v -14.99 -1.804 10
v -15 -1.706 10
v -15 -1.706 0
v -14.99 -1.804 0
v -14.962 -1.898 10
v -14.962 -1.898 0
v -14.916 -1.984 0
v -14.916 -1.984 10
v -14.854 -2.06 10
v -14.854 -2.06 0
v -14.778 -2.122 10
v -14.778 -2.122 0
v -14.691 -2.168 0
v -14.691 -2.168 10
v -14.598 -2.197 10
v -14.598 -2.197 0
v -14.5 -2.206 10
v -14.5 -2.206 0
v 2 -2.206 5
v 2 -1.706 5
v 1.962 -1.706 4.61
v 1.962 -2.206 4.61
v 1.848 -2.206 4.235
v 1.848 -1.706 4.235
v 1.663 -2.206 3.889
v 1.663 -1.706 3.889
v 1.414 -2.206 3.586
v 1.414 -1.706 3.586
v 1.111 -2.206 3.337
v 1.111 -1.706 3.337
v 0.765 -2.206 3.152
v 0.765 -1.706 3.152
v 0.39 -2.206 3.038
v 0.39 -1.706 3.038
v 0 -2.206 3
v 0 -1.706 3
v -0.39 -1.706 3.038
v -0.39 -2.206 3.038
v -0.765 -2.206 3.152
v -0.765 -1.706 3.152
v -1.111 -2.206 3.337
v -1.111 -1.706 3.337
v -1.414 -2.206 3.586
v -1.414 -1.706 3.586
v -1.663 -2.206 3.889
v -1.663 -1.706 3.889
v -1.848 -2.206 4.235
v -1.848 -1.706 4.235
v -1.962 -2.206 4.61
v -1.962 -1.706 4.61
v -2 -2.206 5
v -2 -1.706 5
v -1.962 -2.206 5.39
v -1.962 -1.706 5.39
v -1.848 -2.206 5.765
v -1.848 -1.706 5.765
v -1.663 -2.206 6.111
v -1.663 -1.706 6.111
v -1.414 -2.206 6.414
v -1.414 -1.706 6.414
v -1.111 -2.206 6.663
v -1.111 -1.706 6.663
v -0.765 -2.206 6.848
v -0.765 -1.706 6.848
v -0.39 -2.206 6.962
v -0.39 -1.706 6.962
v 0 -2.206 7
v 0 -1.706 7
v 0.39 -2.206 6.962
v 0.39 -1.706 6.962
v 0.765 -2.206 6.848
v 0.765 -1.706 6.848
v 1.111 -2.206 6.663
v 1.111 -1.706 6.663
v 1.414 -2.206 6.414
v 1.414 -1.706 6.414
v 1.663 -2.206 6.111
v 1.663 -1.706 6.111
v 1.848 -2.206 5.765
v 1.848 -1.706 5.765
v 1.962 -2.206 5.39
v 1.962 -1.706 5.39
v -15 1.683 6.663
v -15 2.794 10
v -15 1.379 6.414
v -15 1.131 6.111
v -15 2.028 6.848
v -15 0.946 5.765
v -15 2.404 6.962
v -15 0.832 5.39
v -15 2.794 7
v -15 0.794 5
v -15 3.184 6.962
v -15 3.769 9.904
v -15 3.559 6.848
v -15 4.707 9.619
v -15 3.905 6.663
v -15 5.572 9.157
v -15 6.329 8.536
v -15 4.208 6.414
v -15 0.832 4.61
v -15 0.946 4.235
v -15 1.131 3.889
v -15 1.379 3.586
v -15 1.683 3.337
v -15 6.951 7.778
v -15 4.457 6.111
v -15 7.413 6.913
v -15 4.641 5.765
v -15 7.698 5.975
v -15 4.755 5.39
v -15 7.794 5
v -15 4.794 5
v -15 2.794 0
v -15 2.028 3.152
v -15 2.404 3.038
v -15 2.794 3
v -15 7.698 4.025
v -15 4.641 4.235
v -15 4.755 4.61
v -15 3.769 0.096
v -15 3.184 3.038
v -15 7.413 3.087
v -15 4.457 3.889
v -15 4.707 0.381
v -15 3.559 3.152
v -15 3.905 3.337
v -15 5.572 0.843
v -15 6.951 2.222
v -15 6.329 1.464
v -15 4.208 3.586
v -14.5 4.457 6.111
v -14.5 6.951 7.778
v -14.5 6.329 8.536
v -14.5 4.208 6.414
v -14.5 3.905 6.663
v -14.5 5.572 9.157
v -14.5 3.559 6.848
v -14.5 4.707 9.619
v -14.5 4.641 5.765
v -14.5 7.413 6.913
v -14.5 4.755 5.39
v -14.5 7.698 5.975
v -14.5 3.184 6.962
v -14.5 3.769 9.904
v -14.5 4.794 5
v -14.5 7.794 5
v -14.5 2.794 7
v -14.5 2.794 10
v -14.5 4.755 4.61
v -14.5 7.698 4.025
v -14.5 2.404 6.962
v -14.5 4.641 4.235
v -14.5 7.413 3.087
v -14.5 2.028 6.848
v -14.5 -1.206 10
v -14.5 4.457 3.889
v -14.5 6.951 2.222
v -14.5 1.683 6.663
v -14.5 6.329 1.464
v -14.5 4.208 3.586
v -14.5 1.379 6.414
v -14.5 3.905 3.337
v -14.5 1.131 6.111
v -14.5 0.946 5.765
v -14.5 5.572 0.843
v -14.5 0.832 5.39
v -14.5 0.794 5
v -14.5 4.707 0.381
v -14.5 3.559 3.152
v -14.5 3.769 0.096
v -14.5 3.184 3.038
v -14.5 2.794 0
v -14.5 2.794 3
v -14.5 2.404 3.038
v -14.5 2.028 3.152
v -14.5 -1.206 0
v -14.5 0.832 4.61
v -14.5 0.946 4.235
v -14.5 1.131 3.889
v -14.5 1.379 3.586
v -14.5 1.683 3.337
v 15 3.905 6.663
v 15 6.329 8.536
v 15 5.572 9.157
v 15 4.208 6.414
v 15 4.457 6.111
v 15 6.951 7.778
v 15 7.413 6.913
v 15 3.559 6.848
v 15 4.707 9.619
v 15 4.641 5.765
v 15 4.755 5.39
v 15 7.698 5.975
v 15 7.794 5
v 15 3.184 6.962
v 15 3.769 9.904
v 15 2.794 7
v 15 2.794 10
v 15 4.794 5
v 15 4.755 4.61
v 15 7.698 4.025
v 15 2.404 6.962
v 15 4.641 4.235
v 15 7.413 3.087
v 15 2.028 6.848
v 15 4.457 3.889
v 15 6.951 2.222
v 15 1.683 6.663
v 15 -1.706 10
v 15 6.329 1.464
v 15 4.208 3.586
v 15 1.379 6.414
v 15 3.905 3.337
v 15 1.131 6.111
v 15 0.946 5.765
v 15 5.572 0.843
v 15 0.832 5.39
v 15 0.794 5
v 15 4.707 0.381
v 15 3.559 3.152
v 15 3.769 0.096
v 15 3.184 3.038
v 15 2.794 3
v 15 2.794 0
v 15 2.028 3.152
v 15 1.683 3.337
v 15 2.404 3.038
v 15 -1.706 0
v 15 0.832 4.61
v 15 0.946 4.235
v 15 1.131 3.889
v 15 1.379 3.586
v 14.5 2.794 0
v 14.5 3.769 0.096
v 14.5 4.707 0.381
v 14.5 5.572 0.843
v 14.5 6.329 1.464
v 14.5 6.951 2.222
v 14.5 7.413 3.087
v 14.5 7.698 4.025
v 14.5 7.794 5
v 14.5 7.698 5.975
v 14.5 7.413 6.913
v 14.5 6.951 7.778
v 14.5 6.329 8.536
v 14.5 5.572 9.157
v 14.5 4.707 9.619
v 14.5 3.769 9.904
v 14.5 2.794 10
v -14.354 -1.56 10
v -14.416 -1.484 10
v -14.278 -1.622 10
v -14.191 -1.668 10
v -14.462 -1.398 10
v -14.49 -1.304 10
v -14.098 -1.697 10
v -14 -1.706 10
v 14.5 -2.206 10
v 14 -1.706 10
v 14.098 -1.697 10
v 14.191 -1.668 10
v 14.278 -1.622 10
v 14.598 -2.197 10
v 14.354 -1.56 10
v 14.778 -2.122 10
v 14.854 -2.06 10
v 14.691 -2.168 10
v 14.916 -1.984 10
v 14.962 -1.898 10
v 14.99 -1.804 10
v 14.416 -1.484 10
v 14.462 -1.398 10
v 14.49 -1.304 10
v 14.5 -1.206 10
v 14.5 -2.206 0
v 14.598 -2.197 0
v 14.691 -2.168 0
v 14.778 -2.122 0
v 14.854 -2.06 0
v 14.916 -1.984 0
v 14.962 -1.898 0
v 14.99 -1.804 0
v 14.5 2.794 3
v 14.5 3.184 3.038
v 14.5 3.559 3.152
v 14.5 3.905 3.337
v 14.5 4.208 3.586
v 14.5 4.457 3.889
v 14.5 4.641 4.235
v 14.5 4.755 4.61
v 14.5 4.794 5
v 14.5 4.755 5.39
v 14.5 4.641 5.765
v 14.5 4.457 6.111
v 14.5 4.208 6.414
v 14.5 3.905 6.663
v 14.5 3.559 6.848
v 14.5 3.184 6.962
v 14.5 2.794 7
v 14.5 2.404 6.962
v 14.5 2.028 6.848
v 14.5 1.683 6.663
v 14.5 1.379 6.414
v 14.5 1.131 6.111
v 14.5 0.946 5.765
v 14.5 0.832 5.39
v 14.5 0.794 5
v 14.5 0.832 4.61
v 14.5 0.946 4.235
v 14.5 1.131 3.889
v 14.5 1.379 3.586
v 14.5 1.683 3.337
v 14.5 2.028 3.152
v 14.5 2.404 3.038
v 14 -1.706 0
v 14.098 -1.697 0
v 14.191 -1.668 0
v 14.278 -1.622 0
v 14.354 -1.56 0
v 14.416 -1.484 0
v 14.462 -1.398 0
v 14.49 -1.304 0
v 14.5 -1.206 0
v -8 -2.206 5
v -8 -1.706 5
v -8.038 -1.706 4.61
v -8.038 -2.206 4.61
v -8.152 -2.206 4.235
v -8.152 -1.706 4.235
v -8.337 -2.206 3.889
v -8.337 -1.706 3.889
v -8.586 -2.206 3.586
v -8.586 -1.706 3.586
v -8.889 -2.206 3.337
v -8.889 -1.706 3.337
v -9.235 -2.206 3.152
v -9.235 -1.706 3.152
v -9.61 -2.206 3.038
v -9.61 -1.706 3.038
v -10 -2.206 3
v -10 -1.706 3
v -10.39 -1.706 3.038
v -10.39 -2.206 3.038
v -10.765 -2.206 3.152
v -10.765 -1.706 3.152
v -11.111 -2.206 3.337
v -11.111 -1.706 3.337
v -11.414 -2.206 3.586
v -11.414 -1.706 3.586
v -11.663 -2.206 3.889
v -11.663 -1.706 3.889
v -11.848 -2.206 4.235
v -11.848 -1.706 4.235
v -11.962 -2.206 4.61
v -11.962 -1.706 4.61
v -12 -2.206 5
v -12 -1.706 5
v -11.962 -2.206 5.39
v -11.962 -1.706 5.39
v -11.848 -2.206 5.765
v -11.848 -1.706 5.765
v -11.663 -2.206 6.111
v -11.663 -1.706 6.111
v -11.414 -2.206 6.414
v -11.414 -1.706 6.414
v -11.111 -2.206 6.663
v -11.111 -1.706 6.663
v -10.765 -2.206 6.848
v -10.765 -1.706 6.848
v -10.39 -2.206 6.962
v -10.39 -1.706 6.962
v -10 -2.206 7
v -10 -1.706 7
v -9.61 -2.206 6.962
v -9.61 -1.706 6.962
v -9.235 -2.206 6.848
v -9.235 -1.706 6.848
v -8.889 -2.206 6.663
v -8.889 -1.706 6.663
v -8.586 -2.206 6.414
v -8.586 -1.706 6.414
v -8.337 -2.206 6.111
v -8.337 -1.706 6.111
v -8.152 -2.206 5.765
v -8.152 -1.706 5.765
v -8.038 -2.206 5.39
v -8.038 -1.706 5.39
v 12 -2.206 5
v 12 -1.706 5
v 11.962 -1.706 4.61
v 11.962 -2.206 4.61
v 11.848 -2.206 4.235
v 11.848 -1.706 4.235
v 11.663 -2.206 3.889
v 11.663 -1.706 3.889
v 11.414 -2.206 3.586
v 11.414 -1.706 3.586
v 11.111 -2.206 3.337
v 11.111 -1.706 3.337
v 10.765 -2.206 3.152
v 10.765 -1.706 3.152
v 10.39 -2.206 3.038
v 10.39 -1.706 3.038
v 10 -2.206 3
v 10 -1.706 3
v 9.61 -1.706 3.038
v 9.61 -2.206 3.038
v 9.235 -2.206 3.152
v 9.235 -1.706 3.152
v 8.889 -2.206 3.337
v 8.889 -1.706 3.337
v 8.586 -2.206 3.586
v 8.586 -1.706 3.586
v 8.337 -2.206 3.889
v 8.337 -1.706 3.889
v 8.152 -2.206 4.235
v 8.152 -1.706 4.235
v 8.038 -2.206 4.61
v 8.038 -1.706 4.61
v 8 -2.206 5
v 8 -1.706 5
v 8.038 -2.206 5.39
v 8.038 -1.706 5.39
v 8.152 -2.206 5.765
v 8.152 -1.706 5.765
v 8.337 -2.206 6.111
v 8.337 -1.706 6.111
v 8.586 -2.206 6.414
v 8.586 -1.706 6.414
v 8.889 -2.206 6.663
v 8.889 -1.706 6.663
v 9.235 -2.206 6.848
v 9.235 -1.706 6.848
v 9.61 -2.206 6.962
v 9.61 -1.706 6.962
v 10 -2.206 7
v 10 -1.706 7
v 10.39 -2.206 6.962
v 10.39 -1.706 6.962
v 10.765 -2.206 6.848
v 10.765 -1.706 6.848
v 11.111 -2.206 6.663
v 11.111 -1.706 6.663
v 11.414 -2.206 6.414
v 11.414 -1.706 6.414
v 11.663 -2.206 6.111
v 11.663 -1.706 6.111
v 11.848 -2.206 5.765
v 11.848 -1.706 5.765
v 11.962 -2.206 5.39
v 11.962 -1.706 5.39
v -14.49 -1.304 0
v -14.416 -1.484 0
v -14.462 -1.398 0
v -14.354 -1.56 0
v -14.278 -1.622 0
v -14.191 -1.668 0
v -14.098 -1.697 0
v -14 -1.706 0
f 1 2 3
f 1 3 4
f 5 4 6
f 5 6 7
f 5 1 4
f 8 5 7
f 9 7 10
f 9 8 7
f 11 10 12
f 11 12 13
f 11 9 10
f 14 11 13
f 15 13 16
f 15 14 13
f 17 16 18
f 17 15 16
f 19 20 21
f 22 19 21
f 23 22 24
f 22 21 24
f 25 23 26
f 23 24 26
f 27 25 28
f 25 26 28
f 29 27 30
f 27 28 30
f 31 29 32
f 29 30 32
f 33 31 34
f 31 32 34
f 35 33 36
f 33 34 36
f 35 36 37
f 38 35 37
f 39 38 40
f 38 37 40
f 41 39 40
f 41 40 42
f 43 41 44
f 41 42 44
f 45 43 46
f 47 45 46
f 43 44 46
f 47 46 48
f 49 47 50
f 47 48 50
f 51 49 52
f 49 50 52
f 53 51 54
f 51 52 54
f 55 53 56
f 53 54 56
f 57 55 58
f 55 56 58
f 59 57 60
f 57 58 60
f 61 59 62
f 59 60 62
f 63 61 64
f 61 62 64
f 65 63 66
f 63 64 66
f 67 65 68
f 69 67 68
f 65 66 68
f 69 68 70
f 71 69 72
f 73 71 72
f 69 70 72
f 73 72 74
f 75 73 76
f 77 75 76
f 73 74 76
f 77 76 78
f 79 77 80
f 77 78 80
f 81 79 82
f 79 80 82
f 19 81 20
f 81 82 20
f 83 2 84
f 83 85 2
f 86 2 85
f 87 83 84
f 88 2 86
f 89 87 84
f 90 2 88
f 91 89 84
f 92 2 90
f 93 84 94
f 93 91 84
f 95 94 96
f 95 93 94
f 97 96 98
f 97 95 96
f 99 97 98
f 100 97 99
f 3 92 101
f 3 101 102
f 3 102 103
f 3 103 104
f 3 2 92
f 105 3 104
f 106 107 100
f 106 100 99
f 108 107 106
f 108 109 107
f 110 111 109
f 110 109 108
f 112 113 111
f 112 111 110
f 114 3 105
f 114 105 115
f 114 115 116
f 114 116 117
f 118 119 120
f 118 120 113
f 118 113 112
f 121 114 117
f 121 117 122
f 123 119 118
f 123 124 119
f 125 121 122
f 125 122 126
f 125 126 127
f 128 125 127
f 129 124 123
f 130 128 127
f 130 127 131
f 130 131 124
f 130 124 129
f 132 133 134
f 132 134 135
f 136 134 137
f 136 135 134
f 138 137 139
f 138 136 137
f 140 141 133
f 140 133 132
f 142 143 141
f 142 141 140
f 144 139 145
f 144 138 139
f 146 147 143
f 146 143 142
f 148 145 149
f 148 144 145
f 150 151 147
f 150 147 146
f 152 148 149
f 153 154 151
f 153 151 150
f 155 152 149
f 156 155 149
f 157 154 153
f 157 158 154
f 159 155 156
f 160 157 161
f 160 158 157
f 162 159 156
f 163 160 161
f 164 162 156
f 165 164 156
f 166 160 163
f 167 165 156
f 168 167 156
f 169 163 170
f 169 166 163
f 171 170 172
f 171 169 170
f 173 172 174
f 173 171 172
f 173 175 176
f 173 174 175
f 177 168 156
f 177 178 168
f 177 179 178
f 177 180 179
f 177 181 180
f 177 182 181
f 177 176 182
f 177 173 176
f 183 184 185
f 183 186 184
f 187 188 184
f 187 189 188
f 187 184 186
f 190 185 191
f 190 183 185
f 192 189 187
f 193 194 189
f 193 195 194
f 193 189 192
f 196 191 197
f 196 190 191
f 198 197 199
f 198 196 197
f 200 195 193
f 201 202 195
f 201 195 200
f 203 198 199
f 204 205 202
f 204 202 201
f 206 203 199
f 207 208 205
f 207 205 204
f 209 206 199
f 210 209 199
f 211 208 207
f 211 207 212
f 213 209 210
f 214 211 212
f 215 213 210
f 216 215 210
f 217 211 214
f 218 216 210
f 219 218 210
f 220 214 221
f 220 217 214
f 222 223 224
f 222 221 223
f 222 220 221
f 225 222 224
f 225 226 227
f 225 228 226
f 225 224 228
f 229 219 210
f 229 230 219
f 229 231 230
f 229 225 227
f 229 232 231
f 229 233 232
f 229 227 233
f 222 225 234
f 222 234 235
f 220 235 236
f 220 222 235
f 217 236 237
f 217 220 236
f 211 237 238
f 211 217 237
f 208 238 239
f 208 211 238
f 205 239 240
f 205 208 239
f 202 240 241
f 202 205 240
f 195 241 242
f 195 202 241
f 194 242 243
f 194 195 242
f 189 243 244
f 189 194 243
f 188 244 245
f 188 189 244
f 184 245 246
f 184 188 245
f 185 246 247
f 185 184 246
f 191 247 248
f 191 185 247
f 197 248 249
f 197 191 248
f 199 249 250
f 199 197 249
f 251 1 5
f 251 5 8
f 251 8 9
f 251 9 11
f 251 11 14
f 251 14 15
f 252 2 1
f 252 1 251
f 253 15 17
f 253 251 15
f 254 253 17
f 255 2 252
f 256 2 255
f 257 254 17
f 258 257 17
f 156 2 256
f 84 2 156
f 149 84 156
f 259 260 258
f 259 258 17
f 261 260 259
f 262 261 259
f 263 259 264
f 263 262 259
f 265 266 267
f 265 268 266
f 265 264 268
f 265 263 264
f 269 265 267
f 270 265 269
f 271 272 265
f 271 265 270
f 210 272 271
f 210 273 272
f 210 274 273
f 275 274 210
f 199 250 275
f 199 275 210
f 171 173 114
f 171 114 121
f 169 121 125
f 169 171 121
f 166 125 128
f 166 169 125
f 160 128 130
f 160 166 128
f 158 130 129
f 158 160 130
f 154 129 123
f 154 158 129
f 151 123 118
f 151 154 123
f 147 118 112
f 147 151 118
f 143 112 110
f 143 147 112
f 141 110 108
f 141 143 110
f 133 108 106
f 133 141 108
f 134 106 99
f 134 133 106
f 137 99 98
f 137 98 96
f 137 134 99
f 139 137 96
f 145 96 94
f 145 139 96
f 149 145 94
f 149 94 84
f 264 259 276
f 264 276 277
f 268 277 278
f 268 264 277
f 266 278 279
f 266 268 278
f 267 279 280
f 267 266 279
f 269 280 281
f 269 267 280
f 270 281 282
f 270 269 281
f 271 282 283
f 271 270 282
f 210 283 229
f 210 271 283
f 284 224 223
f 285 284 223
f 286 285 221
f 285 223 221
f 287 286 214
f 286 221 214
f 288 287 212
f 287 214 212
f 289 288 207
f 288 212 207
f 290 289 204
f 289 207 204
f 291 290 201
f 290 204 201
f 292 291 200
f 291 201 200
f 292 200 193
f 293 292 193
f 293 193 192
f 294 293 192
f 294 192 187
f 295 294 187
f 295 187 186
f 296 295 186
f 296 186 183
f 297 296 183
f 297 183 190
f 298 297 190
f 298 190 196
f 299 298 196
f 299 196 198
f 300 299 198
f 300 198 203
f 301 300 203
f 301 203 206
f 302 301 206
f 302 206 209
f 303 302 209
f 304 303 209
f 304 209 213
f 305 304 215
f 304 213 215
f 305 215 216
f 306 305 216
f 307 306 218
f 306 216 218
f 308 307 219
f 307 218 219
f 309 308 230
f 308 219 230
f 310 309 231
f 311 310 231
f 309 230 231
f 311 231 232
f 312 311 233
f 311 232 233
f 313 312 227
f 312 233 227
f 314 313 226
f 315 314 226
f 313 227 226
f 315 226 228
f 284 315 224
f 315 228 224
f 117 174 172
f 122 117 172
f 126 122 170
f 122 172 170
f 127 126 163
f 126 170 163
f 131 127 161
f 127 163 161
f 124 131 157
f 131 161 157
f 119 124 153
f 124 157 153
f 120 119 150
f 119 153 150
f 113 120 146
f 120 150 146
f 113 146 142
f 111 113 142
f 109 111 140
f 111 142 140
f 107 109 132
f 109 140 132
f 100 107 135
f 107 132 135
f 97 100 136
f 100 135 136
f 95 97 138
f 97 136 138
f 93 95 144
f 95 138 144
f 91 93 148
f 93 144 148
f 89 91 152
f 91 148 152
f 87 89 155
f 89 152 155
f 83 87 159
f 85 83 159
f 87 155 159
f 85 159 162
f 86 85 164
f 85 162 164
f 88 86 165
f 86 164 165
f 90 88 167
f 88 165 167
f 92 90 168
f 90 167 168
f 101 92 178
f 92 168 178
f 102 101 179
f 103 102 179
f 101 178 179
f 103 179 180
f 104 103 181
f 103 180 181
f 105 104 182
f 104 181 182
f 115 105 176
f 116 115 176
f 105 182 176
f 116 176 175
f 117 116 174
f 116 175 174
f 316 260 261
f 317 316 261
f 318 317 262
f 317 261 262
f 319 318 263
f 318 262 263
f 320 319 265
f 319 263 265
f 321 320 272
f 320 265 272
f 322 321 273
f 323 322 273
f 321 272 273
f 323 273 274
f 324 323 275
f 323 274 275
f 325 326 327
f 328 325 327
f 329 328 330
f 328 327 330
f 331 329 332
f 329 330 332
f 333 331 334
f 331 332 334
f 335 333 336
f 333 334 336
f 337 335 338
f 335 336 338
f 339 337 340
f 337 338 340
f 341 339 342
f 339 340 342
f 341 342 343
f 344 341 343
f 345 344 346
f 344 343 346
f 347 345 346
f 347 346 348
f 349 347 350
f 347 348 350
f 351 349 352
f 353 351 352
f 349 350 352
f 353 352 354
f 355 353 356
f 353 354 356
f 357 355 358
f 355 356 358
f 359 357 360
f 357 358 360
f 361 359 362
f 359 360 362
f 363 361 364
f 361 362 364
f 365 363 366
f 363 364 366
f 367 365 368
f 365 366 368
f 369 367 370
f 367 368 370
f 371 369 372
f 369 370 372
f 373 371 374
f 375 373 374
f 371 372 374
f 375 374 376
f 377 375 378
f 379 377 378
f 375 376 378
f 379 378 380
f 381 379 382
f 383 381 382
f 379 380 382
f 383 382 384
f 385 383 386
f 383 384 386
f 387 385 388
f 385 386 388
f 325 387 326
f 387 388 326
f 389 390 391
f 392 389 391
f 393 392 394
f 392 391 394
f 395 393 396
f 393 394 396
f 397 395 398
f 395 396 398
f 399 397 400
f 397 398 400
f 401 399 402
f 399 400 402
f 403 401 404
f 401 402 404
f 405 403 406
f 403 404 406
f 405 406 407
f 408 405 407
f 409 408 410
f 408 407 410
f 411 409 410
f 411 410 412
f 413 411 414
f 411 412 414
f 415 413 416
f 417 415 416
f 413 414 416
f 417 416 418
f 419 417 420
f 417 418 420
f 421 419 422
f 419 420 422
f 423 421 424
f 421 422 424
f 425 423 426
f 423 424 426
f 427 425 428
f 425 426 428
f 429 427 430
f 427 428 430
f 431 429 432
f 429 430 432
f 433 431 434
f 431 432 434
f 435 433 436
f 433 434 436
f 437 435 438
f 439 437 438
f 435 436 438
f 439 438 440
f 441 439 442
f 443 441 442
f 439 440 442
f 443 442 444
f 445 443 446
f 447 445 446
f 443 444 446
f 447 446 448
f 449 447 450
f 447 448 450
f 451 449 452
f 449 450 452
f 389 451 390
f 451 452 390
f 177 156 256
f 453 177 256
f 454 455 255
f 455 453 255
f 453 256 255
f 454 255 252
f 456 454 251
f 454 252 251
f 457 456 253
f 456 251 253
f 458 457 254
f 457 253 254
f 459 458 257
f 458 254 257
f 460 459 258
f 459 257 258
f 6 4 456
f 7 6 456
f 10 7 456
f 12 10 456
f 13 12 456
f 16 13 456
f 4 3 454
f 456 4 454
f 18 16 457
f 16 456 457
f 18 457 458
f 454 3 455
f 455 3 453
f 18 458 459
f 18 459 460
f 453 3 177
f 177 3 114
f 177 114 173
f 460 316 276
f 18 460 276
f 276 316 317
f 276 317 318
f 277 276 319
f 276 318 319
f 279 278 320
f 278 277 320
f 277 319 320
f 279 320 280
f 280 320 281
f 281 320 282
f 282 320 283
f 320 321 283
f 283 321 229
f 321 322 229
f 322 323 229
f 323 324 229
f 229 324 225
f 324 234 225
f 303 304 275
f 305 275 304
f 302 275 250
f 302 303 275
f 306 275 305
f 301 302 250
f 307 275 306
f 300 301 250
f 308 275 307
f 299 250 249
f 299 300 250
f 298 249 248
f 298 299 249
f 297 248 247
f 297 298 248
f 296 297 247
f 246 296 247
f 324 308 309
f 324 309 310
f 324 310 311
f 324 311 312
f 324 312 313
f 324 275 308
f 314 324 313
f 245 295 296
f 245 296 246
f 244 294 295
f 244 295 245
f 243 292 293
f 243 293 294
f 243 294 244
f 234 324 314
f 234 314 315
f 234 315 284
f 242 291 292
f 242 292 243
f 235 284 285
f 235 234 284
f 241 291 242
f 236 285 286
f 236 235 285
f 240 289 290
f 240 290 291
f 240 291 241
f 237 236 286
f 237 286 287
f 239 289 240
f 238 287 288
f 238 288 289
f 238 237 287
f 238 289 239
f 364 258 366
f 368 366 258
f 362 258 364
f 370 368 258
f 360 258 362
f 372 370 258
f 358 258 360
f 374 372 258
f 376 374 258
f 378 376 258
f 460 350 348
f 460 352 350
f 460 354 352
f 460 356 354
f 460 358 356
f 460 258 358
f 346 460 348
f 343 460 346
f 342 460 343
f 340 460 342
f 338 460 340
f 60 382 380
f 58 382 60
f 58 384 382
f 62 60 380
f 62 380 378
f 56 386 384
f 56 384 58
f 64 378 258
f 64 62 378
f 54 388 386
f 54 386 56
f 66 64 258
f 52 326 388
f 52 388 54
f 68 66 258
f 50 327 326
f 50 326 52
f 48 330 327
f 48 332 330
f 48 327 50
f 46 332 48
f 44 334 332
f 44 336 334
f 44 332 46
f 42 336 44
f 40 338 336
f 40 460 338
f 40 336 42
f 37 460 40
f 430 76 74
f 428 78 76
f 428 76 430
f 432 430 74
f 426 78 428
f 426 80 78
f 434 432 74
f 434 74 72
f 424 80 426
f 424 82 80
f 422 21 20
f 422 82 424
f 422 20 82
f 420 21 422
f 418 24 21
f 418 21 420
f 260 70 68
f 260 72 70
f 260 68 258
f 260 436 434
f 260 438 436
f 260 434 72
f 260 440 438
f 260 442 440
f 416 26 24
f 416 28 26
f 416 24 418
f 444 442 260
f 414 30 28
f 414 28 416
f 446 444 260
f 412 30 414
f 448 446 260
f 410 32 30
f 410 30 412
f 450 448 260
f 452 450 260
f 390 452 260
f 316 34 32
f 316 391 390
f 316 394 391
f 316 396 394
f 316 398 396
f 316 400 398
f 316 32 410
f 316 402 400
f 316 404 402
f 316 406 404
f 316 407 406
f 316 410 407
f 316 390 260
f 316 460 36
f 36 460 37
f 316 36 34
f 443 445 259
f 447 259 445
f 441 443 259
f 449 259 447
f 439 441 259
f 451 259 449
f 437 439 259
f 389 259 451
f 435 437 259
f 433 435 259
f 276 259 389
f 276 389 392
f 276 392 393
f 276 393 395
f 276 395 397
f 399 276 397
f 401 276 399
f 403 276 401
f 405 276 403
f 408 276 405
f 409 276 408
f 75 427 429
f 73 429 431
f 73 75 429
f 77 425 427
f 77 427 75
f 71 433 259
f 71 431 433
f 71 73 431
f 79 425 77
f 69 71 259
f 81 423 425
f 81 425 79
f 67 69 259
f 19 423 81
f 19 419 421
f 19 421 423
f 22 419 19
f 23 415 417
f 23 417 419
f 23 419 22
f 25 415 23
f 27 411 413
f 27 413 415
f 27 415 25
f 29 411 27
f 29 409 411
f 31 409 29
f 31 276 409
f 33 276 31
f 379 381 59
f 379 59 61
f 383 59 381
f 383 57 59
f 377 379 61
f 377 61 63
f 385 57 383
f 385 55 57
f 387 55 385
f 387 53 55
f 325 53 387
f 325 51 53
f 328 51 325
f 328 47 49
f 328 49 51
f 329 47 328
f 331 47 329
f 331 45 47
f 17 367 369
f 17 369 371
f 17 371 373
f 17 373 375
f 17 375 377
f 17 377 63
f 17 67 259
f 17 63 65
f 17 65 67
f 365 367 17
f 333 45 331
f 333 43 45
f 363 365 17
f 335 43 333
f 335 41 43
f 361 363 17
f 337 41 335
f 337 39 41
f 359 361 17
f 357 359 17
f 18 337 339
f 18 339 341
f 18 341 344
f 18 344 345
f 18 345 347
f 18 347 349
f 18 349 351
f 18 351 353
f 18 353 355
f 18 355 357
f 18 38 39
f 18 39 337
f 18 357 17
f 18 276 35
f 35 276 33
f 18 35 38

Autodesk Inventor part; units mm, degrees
ref_plane "YZ Plane" through (0, 0, 0) normal (1, 0, 0) x (0, 1, 0)
ref_plane "XZ Plane" through (0, 0, 0) normal (0, 1, 0) x (-1, 0, 0)
ref_plane "XY Plane" through (0, 0, 0) normal (0, 0, 1) x (1, 0, 0)
sketch "Náčrt1" plane through (0, 0, 0) normal (0, 0, 1) x (1, 0, 0)
  line L0 (-14.5, 7.7937) -> (-14.5, -1.7063)
  line L1 (-14.5, -1.7063) -> (14.5, -1.7063)
  line L2 (14.5, -1.7063) -> (14.5, 7.7937)
  line L3 (14.5, 7.7937) -> (15, 7.7937)
  line L4 (15, 7.7937) -> (15, -2.2063)
  line L5 (15, -2.2063) -> (-15, -2.2063)
  line L6 (-15, -2.2063) -> (-15, 7.7937)
  line L7 (-15, 7.7937) -> (-14.5, 7.7937)
  point P0 (0, 0)
  point P1 (14.5, 3.0437)
  point P2 (-14.75, 7.7937)
  point P3 (14.75, 7.7937)
  dimension "d0" = 15
  dimension "d1" = 15
  dimension "d2" = 0.5
  dimension "d3" = 0.5
  dimension "d4" = 0.5
  dimension "d5" = 10
  dimension "d6" = 10
extrude "Vysunutí1" add sketch "Náčrt1" along normal blind 10
sketch "Náčrt2" plane through (15, -2.2063, 0) normal (1, 0, 0) x (0, 0, -1)
  circle A0 centre (-5, 5) radius 2
  line L0 (0, 0) -> (0, 10) projected
  point P0 (0, 2.2063)
  point P1 (0, 5)
  dimension "d9" = 4
  dimension "d10" = 5
extrude "Vysunutí2" cut sketch "Náčrt2" against normal through all
pattern_linear "Obdélníkové pole1" count 10 spacing 10 along (0, 0, 1) of "Vysunutí2"
sketch "Náčrt3" plane through (-14.5, -1.7063, 0) normal (0, 1, 0) x (1, 0, 0)
  circle A0 centre (4.5, -5) radius 2
  line L0 (29, -10) -> (0, -10) projected
  line L1 (-0.5, 0) -> (-0.5, -10) projected
  point P0 (14.5, 0)
  dimension "d16" = 4
  dimension "d17" = 5
  dimension "d18" = 5
extrude "Vysunutí3" cut sketch "Náčrt3" against normal through all
pattern_linear "Obdélníkové pole2" count 10 spacing 10 along (0, 0, -1) count 5 spacing 10 along (1, 0, 0) of "Vysunutí3"
sketch "Náčrt4" plane through (15, -2.2063, 0) normal (1, 0, 0) x (0, 0, -1)
  arc A0 (0, 5) -> (-10, 5) centre (-5, 5) ccw
  line L0 (0, 0) -> (0, 10) projected
  line L1 (0, 0) -> (-10, 0) projected
  line L2 (0, 10) -> (-10, 10) projected
  line L3 (-10, 10) -> (0, 10)
  line L4 (0, 10) -> (0, 5)
  line L5 (0, 10) -> (0, 0.5) projected
  line L6 (-10, 10) -> (-10, 0.5) projected
  line L7 (-10, 5) -> (-10, 10)
  point P0 (0, 2.2063)
  point P1 (-5, 10)
  dimension "d27" = 10
  dimension "d28" = 5
  dimension "d29" = 5
extrude "Vysunutí4" cut sketch "Náčrt4" against normal through all
fillet "Zaoblení1" radius 0.5 2 edges at (15, -2.2063, 5) (14.5, -1.7063, 5)
fillet "Zaoblení2" radius 0.5 2 edges at (-15, -2.2063, 5) (-14.5, -1.7063, 5)
properties part number "3031"
